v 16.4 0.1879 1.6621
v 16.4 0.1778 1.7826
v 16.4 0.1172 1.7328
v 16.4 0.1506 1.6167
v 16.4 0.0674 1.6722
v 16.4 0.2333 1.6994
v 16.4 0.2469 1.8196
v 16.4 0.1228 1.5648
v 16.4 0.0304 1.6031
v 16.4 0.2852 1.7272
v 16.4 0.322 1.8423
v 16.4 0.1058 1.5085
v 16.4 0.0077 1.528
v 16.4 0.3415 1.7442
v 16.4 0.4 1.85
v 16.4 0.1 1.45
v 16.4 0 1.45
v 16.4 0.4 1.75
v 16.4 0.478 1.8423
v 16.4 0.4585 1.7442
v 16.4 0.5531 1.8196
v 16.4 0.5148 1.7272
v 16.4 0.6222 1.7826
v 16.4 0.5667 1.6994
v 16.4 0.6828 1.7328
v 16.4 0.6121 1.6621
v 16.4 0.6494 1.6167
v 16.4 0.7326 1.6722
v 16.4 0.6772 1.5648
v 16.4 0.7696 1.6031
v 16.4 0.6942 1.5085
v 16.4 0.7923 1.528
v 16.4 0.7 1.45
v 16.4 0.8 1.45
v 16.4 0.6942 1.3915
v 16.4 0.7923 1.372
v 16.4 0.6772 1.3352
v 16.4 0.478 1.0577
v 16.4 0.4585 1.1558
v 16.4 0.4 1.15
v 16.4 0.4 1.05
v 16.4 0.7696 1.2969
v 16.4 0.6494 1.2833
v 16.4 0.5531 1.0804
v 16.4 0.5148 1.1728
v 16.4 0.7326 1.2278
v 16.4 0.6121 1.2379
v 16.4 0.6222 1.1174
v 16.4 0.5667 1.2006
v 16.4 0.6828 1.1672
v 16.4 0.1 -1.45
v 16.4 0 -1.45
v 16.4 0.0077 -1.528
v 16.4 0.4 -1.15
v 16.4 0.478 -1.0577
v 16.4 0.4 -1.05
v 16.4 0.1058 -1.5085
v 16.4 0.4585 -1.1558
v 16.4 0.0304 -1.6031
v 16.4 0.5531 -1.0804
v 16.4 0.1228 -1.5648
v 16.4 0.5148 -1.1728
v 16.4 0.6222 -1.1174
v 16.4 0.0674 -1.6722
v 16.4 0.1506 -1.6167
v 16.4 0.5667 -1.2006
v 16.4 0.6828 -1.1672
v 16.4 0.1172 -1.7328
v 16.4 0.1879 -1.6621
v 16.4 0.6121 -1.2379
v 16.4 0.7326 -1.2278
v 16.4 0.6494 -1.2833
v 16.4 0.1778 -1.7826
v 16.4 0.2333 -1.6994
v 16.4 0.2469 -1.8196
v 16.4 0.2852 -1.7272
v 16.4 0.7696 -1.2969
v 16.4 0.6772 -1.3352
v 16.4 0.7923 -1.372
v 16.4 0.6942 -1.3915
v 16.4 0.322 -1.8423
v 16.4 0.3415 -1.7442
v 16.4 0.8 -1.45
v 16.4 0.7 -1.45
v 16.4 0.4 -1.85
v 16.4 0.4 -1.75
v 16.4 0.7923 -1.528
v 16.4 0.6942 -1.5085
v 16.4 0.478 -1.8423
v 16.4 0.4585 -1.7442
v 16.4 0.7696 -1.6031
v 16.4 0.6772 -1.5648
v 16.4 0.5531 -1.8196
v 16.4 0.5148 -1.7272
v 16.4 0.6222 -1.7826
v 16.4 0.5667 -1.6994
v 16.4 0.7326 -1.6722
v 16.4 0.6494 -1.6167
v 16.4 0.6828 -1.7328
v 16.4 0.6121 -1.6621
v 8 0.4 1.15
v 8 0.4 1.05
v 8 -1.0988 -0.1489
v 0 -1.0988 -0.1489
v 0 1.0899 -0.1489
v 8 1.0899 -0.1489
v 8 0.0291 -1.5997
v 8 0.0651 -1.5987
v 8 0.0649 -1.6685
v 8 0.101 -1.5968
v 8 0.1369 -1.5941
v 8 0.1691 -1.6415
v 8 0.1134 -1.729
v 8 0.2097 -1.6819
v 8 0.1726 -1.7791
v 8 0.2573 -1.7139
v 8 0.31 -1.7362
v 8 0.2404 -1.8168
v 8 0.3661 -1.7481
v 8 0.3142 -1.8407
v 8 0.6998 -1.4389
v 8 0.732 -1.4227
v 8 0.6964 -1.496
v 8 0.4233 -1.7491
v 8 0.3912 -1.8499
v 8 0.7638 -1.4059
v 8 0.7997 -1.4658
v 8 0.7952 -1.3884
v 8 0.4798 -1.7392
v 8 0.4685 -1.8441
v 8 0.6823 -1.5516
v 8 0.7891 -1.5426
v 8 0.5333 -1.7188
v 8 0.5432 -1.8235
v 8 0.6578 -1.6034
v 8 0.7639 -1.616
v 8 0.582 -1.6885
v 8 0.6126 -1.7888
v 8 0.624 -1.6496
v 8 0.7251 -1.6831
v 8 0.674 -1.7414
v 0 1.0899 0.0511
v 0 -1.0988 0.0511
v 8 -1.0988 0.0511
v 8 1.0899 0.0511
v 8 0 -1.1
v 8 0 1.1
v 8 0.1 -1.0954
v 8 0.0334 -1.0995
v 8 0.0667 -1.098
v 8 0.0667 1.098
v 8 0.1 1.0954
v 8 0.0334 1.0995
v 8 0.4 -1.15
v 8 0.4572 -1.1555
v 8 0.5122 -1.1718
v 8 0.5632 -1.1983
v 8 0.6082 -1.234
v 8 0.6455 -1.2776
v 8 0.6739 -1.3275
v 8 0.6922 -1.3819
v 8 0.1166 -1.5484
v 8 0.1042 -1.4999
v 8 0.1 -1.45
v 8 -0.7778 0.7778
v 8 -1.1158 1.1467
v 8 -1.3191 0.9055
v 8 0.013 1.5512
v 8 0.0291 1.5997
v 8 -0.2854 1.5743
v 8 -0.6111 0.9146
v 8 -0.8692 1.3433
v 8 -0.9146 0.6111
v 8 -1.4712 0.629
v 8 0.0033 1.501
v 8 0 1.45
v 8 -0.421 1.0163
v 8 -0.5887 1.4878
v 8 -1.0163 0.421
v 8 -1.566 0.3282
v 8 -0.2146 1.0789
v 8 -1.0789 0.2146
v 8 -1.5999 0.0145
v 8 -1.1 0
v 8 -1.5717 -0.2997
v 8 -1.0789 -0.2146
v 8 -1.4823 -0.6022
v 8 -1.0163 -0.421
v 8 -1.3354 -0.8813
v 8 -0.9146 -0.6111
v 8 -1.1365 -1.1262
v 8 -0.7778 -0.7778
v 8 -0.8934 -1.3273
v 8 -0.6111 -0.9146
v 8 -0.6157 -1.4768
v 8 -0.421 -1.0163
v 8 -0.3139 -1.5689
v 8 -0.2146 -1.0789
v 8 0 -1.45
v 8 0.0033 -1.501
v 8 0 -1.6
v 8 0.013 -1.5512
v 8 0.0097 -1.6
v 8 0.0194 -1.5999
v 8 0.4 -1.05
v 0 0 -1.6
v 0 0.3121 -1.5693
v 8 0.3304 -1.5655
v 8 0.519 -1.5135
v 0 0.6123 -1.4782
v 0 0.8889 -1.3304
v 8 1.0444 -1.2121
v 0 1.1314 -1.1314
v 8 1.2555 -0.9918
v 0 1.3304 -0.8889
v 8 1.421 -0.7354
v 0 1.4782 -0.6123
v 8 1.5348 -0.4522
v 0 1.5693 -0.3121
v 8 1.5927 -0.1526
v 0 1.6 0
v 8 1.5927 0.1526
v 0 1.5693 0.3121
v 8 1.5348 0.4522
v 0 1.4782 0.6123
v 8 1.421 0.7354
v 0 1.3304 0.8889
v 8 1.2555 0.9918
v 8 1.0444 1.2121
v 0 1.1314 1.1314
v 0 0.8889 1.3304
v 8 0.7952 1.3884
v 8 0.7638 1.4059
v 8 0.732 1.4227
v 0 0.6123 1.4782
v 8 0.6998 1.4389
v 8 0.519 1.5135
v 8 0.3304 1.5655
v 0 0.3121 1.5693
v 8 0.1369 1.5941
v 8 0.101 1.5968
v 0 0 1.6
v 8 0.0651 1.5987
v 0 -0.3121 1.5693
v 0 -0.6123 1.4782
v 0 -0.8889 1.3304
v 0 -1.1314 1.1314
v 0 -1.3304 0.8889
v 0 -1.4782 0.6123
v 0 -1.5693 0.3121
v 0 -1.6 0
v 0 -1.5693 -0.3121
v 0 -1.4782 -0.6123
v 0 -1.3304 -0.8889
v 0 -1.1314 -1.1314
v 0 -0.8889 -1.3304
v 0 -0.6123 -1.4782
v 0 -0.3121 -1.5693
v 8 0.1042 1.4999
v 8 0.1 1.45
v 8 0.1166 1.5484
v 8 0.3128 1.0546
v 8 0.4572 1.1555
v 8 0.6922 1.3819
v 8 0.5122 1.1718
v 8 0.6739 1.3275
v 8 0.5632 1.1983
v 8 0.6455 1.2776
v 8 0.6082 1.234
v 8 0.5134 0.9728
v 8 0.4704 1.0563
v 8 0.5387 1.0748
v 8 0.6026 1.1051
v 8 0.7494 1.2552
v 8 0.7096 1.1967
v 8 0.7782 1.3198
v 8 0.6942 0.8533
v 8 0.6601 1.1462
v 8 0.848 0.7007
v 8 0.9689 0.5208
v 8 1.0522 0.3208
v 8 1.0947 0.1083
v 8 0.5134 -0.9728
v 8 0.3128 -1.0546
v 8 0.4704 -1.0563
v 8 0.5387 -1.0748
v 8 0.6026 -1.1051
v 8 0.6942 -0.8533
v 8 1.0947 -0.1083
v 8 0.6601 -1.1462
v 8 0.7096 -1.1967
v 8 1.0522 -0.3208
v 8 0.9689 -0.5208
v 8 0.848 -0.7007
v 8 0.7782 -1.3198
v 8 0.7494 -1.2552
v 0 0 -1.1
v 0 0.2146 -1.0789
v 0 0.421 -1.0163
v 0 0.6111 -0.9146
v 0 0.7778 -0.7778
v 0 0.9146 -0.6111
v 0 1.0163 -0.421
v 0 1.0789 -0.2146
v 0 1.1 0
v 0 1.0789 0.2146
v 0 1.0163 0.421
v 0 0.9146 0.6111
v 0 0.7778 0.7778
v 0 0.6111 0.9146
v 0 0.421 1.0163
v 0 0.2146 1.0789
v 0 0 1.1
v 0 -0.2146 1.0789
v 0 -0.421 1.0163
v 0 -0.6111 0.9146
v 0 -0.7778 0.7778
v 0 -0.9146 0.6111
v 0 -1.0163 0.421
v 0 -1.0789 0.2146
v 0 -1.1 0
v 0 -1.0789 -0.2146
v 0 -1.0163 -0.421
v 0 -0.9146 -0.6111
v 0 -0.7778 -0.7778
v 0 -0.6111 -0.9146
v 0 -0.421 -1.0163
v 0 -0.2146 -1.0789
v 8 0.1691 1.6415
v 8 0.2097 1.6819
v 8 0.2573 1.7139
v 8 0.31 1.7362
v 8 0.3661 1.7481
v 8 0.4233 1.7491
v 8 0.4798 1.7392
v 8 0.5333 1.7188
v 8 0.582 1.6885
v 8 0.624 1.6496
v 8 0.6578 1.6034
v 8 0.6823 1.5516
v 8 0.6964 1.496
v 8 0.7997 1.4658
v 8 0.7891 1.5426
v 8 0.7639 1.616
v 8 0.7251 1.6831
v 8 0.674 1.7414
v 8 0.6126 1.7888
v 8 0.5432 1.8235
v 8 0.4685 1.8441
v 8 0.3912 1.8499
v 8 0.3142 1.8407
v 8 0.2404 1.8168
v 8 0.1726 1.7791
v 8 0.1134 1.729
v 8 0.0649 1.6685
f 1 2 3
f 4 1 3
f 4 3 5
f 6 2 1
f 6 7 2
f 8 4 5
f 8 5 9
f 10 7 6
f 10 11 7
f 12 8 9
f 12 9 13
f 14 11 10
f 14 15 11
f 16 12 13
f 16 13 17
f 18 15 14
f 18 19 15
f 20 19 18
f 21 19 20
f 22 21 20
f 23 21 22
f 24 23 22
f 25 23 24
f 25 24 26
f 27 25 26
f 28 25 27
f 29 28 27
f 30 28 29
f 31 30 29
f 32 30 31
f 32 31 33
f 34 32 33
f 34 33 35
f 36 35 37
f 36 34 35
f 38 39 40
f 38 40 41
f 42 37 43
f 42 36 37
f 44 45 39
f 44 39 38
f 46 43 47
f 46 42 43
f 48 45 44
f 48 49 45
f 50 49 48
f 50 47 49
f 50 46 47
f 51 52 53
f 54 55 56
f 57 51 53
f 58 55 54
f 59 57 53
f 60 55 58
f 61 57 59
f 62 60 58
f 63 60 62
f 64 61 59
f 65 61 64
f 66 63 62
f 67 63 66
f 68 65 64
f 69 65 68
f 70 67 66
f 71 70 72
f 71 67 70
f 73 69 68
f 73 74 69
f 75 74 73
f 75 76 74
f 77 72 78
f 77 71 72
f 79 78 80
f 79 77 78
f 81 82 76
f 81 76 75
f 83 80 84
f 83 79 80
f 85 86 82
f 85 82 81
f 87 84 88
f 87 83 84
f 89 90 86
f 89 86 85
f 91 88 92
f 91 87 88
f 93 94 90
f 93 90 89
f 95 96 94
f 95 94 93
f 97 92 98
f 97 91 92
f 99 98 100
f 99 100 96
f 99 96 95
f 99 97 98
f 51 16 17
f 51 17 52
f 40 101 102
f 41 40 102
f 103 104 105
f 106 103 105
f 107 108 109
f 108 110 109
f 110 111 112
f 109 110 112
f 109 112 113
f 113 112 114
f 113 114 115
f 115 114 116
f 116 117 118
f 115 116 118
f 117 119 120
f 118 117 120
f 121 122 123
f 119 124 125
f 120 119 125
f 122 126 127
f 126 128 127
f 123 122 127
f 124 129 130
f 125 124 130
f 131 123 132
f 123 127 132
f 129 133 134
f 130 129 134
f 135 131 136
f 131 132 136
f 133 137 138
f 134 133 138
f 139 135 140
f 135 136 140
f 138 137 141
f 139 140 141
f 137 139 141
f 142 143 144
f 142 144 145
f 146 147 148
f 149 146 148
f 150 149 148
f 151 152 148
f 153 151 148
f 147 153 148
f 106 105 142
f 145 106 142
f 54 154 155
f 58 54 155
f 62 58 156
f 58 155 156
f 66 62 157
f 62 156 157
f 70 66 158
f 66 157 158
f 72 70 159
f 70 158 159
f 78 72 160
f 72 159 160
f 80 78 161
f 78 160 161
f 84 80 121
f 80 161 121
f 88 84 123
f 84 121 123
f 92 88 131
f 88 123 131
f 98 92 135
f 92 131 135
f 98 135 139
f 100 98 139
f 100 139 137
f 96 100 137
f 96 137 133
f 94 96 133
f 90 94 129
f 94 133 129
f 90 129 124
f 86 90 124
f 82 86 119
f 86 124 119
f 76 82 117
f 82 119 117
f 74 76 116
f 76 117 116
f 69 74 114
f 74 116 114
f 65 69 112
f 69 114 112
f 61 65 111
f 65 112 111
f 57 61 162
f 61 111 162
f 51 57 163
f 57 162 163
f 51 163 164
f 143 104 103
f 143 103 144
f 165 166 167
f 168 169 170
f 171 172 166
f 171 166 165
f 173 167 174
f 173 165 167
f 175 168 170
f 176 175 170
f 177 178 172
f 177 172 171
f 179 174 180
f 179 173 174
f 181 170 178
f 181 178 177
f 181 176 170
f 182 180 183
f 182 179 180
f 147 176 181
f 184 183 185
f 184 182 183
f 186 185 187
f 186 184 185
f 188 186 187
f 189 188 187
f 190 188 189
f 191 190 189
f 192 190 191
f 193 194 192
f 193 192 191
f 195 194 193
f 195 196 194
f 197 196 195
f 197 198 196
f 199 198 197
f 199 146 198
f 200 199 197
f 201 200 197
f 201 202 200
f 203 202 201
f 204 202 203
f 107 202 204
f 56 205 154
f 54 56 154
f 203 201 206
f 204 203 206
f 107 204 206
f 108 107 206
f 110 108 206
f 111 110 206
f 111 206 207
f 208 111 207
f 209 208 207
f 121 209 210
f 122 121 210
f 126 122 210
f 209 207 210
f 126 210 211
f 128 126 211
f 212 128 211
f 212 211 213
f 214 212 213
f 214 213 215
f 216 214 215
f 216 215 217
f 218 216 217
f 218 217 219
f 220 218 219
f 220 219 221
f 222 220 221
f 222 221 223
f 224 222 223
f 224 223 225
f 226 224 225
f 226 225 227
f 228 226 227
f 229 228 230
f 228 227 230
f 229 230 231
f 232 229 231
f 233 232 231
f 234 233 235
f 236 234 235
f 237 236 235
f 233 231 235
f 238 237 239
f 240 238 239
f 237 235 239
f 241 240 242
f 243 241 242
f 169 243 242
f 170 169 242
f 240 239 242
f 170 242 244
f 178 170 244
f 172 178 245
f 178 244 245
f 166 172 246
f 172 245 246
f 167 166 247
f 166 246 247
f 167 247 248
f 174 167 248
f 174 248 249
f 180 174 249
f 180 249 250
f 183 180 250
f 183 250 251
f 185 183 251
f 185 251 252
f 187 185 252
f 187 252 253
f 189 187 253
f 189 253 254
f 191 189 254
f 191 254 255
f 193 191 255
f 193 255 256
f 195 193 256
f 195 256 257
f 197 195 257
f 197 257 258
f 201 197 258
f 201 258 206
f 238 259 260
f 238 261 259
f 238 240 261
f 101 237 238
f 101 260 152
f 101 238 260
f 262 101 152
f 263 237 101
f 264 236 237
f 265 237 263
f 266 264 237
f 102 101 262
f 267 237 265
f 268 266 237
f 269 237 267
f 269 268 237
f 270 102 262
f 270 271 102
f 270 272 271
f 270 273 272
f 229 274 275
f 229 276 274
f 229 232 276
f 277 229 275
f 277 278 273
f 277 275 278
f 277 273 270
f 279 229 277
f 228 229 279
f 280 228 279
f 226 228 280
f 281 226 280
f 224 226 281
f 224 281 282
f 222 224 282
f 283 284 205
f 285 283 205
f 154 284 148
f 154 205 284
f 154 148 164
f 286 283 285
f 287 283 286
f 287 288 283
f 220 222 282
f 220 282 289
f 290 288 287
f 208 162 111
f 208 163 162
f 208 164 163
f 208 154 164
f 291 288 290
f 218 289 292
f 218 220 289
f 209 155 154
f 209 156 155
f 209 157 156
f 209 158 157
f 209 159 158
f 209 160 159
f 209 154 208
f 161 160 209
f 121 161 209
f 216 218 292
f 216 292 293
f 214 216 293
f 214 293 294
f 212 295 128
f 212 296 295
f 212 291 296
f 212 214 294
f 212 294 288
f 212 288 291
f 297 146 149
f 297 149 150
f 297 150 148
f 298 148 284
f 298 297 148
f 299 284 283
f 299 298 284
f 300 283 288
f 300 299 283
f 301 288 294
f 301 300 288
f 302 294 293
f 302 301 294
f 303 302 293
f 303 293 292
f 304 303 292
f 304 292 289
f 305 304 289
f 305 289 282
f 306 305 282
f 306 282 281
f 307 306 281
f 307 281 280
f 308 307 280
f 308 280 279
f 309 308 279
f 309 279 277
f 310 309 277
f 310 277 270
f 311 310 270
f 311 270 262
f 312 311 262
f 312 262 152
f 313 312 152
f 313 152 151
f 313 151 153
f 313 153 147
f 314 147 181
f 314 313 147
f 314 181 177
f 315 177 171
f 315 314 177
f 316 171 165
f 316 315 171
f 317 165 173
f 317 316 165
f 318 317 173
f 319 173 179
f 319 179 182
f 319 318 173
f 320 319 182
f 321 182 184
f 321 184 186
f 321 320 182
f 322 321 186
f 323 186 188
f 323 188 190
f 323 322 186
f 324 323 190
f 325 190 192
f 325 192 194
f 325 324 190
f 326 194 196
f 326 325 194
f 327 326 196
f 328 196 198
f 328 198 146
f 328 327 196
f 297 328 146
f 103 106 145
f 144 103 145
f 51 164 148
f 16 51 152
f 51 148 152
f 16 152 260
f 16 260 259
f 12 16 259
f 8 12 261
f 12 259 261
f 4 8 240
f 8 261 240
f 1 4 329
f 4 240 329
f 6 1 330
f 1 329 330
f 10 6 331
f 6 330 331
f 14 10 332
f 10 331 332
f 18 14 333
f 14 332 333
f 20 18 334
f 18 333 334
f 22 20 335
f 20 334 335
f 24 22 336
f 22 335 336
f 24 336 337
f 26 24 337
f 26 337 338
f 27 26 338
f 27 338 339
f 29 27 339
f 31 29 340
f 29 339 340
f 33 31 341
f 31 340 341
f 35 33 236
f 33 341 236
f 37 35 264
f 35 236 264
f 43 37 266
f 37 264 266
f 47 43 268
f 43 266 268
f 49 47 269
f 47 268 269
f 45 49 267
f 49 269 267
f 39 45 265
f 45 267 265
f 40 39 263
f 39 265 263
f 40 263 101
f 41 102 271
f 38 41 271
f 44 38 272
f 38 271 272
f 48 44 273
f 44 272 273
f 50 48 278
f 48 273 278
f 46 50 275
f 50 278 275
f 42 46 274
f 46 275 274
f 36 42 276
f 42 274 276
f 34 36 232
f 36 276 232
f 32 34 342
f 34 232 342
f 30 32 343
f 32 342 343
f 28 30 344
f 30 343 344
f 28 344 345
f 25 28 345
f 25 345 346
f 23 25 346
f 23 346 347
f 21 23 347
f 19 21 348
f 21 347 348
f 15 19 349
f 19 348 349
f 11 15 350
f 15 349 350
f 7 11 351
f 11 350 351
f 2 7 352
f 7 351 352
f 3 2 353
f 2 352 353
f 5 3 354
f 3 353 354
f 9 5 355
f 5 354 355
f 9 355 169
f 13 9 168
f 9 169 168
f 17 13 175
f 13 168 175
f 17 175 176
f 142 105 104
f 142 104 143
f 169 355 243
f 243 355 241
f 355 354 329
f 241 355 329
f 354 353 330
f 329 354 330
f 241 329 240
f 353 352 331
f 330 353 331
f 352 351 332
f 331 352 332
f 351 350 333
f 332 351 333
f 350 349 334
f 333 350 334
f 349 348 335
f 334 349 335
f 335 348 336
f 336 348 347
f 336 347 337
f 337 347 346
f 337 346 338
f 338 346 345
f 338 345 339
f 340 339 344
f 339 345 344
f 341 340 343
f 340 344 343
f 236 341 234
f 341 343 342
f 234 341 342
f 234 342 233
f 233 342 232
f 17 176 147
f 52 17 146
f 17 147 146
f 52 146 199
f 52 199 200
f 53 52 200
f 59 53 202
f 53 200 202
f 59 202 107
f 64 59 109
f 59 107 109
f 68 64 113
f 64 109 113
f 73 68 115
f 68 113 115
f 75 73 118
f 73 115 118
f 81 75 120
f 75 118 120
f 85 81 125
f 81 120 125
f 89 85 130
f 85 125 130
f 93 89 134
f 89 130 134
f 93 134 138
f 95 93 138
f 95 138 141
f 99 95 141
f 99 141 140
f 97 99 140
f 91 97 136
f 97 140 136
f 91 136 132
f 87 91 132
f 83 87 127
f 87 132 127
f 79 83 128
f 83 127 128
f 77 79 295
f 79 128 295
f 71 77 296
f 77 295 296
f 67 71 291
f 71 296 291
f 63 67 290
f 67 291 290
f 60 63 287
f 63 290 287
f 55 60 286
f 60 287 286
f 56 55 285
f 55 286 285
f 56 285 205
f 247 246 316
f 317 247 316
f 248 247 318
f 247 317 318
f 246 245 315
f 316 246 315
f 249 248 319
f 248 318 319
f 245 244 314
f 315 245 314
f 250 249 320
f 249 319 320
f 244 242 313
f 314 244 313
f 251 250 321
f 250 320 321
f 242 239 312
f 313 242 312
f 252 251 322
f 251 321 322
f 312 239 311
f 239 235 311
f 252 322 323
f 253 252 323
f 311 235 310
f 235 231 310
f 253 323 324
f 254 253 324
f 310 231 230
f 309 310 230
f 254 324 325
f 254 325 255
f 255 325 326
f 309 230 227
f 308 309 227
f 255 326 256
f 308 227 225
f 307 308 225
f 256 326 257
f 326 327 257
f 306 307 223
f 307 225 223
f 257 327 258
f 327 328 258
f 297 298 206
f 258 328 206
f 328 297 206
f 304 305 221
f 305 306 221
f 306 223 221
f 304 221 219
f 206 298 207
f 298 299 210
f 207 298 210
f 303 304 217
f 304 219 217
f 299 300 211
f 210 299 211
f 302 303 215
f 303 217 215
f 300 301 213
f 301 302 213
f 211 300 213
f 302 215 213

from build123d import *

# Parameters (mm, degrees)
SKETCH1_R           = 1.6
SKETCH1_R_2         = 1.1
BOSS_EXTRUDE1_DEPTH = 8
BOSS_EXTRUDE2_DEPTH = 8.4
SKETCH3_W           = 0.2
SKETCH3_H           = 2.18868951
BOSS_EXTRUDE5_DEPTH = 8


with BuildPart() as part:
    # Sketch1 → Boss-Extrude1 (new body)
    with BuildSketch(Plane(origin=(0, 0, 0), x_dir=(0, 0, -1), z_dir=(1, 0, 0))):
        Circle(SKETCH1_R)
        Circle(SKETCH1_R_2, mode=Mode.SUBTRACT)
    extrude(amount=BOSS_EXTRUDE1_DEPTH)

    # Sketch2 → Boss-Extrude2 (add)
    with BuildSketch(Plane(origin=(8, 0, 0), x_dir=(0, 0, -1), z_dir=(1, 0, 0))):
        with BuildLine():
            Line((-1.45, 0), (1.45, 0))
            ThreePointArc((1.45, 0), (1.732842712, 0.682842712), (1.05, 0.4))
            Line((1.05, 0.4), (1.15, 0.4))
            ThreePointArc((1.15, 0.4), (1.662132034, 0.612132034), (1.45, 0.1))
            Line((1.45, 0.1), (-1.45, 0.1))
            ThreePointArc((-1.45, 0.1), (-1.662132034, 0.612132034), (-1.15, 0.4))
            Line((-1.15, 0.4), (-1.05, 0.4))
            ThreePointArc((-1.05, 0.4), (-1.732842712, 0.682842712), (-1.45, 0))
        make_face()
    extrude(amount=BOSS_EXTRUDE2_DEPTH)


with BuildPart() as body_2:
    # Sketch3 → Boss-Extrude5 (new body)
    with BuildSketch(Plane.ZY):
        with Locations((-0.048883579, -0.004466927)):
            Rectangle(SKETCH3_W, SKETCH3_H)
    extrude(amount=-BOSS_EXTRUDE5_DEPTH)


solid = Compound([part.part, body_2.part])
